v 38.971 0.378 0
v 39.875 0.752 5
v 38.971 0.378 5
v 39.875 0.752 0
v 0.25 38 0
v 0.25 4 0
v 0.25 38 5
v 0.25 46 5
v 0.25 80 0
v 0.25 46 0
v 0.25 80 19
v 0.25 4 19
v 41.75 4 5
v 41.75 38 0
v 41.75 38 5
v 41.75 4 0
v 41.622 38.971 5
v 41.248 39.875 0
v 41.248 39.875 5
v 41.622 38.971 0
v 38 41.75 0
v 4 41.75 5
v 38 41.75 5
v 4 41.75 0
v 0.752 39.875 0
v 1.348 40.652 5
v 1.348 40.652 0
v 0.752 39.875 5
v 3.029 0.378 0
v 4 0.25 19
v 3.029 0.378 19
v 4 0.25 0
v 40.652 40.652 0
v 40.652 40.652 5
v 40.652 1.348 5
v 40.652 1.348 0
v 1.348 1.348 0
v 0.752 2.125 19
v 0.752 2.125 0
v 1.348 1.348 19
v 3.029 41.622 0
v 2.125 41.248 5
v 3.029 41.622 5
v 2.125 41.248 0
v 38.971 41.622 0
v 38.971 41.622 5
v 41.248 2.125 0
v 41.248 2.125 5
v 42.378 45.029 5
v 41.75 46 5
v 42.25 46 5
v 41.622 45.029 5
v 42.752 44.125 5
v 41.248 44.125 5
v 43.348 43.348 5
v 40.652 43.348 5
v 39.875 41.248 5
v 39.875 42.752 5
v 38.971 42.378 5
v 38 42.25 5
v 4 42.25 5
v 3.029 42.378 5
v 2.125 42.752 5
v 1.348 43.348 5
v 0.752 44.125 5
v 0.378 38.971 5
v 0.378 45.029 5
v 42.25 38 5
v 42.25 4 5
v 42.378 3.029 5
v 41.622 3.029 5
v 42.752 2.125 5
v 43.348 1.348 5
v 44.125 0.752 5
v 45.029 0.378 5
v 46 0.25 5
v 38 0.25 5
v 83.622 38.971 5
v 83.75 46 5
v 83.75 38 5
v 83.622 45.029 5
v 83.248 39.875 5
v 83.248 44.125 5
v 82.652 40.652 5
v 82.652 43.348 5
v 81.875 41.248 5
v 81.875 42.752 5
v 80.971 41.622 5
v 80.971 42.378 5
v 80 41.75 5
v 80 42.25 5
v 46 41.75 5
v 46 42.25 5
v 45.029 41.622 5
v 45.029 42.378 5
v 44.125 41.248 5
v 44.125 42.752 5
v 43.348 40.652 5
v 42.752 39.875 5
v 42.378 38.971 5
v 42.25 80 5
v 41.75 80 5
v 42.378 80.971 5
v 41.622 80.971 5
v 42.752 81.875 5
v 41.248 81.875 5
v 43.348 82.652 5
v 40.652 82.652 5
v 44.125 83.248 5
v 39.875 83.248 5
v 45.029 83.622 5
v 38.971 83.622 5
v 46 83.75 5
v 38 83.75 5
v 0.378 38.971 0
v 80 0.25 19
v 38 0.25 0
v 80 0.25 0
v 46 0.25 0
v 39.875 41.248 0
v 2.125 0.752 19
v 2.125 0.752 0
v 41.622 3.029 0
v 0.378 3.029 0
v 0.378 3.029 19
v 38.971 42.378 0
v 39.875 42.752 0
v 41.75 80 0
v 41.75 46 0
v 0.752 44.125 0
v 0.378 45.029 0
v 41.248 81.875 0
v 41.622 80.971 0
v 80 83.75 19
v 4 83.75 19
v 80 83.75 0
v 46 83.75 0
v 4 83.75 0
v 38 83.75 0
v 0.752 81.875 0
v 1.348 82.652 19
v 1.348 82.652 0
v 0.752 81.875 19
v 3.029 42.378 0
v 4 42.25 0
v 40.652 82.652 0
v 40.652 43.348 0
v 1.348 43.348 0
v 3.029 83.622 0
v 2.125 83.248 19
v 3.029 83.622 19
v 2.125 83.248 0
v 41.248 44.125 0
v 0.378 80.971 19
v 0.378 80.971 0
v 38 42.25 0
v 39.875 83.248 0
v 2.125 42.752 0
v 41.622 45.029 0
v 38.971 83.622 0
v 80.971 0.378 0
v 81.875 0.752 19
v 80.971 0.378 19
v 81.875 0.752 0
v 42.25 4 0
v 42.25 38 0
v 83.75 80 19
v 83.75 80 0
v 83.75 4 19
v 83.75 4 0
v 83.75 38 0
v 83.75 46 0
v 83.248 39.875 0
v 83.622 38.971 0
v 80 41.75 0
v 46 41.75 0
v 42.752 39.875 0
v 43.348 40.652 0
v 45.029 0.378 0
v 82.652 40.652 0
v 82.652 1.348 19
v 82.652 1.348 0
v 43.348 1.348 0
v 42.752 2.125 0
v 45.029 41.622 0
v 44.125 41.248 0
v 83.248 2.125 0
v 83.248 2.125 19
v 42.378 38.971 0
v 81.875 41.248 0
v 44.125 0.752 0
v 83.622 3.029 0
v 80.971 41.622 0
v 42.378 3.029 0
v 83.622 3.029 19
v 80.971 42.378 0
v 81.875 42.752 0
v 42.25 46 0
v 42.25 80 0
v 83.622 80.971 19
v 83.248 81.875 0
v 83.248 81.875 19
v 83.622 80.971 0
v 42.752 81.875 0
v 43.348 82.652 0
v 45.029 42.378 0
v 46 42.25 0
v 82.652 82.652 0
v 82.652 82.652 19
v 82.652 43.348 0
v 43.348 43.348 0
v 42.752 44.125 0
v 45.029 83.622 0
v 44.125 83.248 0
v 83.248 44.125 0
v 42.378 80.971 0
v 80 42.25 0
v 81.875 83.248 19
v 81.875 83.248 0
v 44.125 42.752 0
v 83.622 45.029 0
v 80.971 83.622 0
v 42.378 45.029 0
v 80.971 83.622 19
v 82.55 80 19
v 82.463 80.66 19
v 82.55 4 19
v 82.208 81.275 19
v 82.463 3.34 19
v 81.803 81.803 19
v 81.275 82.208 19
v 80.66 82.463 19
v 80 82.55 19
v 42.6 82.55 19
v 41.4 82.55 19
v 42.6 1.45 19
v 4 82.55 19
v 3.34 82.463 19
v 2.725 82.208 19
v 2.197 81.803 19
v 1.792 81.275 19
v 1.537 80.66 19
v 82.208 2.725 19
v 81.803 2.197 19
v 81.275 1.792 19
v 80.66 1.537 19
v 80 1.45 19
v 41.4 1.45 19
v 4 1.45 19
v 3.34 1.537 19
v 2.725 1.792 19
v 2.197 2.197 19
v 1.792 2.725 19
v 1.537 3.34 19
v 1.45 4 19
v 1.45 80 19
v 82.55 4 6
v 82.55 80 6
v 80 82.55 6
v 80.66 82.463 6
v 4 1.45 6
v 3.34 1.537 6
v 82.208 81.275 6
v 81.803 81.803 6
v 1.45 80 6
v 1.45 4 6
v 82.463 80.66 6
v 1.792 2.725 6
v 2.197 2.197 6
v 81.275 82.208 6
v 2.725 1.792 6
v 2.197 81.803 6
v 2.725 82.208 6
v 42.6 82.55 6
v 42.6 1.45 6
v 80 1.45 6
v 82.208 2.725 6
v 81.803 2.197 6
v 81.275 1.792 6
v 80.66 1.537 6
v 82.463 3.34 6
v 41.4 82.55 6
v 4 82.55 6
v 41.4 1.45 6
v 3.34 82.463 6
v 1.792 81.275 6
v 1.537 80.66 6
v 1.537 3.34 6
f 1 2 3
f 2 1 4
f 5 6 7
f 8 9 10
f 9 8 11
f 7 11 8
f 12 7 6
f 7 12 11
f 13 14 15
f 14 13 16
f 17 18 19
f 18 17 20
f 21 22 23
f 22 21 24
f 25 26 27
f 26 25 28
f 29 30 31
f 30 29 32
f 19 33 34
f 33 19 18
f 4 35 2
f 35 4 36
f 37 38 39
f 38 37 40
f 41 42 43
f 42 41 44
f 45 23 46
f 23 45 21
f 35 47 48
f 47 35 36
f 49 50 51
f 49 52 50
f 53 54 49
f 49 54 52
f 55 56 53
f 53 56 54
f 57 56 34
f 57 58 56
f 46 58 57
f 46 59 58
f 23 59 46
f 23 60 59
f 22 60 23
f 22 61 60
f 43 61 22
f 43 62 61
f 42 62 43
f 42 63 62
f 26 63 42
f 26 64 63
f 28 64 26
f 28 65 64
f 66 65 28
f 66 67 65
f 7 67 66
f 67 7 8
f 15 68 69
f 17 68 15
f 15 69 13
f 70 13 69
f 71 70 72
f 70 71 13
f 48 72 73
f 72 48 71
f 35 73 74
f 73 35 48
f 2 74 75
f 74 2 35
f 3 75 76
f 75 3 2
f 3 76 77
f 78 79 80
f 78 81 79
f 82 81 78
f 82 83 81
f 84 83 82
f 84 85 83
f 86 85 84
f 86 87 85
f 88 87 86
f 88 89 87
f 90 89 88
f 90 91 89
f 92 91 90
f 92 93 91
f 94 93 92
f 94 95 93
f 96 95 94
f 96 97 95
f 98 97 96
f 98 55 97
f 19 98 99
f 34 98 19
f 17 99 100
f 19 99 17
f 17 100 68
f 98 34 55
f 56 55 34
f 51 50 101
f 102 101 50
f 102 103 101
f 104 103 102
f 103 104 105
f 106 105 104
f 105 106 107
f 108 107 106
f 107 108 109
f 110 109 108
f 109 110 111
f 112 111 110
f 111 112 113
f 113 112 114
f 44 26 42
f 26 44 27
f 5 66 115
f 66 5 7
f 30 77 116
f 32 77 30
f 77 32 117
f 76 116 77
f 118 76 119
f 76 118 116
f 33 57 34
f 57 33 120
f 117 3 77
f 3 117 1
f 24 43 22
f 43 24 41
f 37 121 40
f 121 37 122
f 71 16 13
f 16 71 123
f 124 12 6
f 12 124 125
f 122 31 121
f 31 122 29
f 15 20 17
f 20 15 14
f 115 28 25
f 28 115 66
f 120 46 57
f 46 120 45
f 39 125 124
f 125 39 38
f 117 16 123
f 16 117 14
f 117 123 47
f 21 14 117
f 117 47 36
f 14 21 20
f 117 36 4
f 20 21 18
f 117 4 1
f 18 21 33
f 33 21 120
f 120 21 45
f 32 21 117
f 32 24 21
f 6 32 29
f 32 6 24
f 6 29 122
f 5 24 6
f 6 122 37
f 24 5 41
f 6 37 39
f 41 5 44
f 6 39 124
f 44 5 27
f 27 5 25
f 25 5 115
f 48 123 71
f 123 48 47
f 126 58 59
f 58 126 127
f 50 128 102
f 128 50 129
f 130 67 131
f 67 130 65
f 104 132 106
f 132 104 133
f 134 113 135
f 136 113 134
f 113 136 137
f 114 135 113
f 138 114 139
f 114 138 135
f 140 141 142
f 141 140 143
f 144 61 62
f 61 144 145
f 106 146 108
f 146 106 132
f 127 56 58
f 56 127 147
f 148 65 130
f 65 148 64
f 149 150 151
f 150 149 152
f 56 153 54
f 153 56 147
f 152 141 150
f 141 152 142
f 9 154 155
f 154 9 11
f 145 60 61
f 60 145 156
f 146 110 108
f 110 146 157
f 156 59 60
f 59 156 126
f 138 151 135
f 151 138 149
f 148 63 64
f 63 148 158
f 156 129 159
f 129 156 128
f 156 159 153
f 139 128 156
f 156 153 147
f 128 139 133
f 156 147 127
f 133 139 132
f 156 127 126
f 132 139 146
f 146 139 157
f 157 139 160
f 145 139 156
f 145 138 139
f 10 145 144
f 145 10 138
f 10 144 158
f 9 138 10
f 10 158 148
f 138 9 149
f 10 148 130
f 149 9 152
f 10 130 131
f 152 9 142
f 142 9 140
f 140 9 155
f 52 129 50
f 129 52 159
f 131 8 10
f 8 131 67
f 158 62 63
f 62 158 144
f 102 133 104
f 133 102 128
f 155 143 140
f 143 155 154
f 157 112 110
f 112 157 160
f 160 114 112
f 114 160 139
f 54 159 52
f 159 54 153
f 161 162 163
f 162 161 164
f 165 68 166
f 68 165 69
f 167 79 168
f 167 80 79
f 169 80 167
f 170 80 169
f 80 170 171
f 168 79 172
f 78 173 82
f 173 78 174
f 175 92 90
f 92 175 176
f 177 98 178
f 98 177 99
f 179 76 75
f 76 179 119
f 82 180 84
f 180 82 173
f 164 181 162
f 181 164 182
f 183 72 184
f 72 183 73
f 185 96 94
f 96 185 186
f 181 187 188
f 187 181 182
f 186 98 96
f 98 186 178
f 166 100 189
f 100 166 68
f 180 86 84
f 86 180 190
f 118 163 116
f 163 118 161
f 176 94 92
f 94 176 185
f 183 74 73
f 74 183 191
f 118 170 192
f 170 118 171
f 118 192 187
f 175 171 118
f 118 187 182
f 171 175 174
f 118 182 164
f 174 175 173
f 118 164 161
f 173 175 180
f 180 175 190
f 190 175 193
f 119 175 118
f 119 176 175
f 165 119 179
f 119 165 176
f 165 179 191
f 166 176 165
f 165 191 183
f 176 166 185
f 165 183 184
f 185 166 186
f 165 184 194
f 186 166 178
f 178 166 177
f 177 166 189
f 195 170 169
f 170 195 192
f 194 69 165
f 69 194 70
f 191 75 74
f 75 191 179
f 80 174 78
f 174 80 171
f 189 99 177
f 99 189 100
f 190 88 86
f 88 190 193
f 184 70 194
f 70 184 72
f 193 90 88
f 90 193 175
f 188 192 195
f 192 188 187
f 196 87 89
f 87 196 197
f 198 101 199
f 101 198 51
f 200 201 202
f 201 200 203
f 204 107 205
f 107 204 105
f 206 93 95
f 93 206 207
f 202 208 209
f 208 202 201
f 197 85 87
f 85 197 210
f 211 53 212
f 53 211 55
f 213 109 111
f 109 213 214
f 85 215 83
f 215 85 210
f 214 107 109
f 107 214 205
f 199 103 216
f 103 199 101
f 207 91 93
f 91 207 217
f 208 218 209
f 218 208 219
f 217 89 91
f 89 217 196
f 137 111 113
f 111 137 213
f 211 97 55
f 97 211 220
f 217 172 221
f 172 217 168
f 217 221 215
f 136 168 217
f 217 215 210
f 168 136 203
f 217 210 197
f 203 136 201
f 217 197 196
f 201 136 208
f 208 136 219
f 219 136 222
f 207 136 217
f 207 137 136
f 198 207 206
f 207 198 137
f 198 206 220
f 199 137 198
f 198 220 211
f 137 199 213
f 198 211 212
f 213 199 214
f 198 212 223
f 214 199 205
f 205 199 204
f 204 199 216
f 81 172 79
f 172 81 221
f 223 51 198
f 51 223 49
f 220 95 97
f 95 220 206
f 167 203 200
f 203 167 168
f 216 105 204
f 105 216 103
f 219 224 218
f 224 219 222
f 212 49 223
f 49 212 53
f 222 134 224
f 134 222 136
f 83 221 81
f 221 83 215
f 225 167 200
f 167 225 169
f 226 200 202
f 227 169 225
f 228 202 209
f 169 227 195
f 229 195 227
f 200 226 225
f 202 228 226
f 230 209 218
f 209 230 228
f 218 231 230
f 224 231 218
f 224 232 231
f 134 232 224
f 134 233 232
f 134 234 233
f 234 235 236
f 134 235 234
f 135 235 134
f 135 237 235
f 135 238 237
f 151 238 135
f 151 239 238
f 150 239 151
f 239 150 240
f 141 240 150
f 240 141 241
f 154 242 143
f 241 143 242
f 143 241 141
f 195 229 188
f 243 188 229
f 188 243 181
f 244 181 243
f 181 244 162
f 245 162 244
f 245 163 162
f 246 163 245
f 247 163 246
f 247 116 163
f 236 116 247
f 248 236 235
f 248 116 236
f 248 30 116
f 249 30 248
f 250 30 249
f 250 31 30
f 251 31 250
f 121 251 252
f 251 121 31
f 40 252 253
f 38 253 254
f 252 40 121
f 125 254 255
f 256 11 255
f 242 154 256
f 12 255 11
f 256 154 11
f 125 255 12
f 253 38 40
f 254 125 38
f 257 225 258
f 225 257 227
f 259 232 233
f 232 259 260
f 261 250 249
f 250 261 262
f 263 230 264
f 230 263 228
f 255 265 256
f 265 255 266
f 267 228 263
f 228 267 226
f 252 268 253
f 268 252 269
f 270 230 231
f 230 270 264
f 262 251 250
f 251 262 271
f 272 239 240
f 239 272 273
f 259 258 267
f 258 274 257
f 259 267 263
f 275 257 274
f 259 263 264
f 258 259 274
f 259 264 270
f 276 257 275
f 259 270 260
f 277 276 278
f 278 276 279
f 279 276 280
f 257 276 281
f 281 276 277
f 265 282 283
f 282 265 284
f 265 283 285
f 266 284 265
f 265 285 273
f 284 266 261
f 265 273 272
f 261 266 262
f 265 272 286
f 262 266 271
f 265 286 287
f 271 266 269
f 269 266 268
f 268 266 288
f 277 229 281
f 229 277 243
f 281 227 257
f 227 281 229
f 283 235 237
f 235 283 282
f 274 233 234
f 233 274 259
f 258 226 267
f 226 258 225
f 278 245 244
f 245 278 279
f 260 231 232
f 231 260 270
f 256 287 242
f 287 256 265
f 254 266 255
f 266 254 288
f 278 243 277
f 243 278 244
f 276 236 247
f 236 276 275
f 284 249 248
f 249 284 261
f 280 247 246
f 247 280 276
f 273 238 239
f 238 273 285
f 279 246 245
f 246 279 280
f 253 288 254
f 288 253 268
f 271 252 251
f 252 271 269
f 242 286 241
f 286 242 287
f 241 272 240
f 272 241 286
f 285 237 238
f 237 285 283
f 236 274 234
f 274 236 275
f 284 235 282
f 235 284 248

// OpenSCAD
// file: modules/lip.scad
include <../constants.scad>
include <base.scad>

// The stacking lip on top of a bin's walls.
module lip(x, y) {
    difference() {
        rounded_block(x, y, lip_height, corner_radius);
        translate([wall * 2, wall * 2, -1]) rounded_block(x - 4 * wall, y - 4 * wall, lip_height + 2, corner_radius - 2 * wall);
    }
}
// file: modules/walls.scad
include <../constants.scad>
include <base.scad>

// A box of x × y × h mm with walls, a floor and dividers along x.
module walls(x, y, h, dividers = 0) {
    difference() {
        rounded_block(x, y, h, corner_radius);
        translate([wall, wall, floor_thickness]) rounded_block(x - 2 * wall, y - 2 * wall, h, corner_radius - wall);
    }
    if (dividers > 0)
        for (i = [1 : dividers])
            translate([i * x / (dividers + 1) - wall / 2, 0, 0]) cube([wall, y, h]);
}
// file: modules/base.scad
include <../constants.scad>

// One foot per grid square, under a bin of w × d squares.
module grid_base(w, d) {
    for (x = [0 : w - 1], y = [0 : d - 1])
        translate([x * grid_pitch + clearance / 2, y * grid_pitch + clearance / 2, 0])
            rounded_block(grid_pitch - clearance, grid_pitch - clearance, base_height, corner_radius);
}

module rounded_block(x, y, h, r) {
    hull()
        for (cx = [r, x - r], cy = [r, y - r])
            translate([cx, cy, 0]) cylinder(r = r, h = h, $fn = 24);
}
// file: constants.scad
// Sizes every part of a bin shares. Each file in modules/ includes this one, and the
// models include all of them, so it is included several times per render (as
// Gridfinity Extended's constants are): the case the app's include once is for.
grid_pitch = 42;
height_unit = 7;
clearance = 0.5;
wall = 1.2;
floor_thickness = 1.0;
corner_radius = 3.75;
base_height = 5;
lip_height = 2.4;
// file: modules/all.scad
include <../constants.scad>
include <base.scad>
include <walls.scad>
include <lip.scad>
// main file
// A shallow tray: one compartment per grid square.
include <modules/all.scad>

// Width in grid units
units_wide = 2; // [1:1:6]
// Depth in grid units
units_deep = 2; // [1:1:6]
// Wall height in mm
wall_height = 14; // [6:1:40]

x = units_wide * grid_pitch - clearance;
y = units_deep * grid_pitch - clearance;

grid_base(units_wide, units_deep);
translate([clearance / 2, clearance / 2, base_height]) walls(x, y, wall_height, units_wide - 1);
